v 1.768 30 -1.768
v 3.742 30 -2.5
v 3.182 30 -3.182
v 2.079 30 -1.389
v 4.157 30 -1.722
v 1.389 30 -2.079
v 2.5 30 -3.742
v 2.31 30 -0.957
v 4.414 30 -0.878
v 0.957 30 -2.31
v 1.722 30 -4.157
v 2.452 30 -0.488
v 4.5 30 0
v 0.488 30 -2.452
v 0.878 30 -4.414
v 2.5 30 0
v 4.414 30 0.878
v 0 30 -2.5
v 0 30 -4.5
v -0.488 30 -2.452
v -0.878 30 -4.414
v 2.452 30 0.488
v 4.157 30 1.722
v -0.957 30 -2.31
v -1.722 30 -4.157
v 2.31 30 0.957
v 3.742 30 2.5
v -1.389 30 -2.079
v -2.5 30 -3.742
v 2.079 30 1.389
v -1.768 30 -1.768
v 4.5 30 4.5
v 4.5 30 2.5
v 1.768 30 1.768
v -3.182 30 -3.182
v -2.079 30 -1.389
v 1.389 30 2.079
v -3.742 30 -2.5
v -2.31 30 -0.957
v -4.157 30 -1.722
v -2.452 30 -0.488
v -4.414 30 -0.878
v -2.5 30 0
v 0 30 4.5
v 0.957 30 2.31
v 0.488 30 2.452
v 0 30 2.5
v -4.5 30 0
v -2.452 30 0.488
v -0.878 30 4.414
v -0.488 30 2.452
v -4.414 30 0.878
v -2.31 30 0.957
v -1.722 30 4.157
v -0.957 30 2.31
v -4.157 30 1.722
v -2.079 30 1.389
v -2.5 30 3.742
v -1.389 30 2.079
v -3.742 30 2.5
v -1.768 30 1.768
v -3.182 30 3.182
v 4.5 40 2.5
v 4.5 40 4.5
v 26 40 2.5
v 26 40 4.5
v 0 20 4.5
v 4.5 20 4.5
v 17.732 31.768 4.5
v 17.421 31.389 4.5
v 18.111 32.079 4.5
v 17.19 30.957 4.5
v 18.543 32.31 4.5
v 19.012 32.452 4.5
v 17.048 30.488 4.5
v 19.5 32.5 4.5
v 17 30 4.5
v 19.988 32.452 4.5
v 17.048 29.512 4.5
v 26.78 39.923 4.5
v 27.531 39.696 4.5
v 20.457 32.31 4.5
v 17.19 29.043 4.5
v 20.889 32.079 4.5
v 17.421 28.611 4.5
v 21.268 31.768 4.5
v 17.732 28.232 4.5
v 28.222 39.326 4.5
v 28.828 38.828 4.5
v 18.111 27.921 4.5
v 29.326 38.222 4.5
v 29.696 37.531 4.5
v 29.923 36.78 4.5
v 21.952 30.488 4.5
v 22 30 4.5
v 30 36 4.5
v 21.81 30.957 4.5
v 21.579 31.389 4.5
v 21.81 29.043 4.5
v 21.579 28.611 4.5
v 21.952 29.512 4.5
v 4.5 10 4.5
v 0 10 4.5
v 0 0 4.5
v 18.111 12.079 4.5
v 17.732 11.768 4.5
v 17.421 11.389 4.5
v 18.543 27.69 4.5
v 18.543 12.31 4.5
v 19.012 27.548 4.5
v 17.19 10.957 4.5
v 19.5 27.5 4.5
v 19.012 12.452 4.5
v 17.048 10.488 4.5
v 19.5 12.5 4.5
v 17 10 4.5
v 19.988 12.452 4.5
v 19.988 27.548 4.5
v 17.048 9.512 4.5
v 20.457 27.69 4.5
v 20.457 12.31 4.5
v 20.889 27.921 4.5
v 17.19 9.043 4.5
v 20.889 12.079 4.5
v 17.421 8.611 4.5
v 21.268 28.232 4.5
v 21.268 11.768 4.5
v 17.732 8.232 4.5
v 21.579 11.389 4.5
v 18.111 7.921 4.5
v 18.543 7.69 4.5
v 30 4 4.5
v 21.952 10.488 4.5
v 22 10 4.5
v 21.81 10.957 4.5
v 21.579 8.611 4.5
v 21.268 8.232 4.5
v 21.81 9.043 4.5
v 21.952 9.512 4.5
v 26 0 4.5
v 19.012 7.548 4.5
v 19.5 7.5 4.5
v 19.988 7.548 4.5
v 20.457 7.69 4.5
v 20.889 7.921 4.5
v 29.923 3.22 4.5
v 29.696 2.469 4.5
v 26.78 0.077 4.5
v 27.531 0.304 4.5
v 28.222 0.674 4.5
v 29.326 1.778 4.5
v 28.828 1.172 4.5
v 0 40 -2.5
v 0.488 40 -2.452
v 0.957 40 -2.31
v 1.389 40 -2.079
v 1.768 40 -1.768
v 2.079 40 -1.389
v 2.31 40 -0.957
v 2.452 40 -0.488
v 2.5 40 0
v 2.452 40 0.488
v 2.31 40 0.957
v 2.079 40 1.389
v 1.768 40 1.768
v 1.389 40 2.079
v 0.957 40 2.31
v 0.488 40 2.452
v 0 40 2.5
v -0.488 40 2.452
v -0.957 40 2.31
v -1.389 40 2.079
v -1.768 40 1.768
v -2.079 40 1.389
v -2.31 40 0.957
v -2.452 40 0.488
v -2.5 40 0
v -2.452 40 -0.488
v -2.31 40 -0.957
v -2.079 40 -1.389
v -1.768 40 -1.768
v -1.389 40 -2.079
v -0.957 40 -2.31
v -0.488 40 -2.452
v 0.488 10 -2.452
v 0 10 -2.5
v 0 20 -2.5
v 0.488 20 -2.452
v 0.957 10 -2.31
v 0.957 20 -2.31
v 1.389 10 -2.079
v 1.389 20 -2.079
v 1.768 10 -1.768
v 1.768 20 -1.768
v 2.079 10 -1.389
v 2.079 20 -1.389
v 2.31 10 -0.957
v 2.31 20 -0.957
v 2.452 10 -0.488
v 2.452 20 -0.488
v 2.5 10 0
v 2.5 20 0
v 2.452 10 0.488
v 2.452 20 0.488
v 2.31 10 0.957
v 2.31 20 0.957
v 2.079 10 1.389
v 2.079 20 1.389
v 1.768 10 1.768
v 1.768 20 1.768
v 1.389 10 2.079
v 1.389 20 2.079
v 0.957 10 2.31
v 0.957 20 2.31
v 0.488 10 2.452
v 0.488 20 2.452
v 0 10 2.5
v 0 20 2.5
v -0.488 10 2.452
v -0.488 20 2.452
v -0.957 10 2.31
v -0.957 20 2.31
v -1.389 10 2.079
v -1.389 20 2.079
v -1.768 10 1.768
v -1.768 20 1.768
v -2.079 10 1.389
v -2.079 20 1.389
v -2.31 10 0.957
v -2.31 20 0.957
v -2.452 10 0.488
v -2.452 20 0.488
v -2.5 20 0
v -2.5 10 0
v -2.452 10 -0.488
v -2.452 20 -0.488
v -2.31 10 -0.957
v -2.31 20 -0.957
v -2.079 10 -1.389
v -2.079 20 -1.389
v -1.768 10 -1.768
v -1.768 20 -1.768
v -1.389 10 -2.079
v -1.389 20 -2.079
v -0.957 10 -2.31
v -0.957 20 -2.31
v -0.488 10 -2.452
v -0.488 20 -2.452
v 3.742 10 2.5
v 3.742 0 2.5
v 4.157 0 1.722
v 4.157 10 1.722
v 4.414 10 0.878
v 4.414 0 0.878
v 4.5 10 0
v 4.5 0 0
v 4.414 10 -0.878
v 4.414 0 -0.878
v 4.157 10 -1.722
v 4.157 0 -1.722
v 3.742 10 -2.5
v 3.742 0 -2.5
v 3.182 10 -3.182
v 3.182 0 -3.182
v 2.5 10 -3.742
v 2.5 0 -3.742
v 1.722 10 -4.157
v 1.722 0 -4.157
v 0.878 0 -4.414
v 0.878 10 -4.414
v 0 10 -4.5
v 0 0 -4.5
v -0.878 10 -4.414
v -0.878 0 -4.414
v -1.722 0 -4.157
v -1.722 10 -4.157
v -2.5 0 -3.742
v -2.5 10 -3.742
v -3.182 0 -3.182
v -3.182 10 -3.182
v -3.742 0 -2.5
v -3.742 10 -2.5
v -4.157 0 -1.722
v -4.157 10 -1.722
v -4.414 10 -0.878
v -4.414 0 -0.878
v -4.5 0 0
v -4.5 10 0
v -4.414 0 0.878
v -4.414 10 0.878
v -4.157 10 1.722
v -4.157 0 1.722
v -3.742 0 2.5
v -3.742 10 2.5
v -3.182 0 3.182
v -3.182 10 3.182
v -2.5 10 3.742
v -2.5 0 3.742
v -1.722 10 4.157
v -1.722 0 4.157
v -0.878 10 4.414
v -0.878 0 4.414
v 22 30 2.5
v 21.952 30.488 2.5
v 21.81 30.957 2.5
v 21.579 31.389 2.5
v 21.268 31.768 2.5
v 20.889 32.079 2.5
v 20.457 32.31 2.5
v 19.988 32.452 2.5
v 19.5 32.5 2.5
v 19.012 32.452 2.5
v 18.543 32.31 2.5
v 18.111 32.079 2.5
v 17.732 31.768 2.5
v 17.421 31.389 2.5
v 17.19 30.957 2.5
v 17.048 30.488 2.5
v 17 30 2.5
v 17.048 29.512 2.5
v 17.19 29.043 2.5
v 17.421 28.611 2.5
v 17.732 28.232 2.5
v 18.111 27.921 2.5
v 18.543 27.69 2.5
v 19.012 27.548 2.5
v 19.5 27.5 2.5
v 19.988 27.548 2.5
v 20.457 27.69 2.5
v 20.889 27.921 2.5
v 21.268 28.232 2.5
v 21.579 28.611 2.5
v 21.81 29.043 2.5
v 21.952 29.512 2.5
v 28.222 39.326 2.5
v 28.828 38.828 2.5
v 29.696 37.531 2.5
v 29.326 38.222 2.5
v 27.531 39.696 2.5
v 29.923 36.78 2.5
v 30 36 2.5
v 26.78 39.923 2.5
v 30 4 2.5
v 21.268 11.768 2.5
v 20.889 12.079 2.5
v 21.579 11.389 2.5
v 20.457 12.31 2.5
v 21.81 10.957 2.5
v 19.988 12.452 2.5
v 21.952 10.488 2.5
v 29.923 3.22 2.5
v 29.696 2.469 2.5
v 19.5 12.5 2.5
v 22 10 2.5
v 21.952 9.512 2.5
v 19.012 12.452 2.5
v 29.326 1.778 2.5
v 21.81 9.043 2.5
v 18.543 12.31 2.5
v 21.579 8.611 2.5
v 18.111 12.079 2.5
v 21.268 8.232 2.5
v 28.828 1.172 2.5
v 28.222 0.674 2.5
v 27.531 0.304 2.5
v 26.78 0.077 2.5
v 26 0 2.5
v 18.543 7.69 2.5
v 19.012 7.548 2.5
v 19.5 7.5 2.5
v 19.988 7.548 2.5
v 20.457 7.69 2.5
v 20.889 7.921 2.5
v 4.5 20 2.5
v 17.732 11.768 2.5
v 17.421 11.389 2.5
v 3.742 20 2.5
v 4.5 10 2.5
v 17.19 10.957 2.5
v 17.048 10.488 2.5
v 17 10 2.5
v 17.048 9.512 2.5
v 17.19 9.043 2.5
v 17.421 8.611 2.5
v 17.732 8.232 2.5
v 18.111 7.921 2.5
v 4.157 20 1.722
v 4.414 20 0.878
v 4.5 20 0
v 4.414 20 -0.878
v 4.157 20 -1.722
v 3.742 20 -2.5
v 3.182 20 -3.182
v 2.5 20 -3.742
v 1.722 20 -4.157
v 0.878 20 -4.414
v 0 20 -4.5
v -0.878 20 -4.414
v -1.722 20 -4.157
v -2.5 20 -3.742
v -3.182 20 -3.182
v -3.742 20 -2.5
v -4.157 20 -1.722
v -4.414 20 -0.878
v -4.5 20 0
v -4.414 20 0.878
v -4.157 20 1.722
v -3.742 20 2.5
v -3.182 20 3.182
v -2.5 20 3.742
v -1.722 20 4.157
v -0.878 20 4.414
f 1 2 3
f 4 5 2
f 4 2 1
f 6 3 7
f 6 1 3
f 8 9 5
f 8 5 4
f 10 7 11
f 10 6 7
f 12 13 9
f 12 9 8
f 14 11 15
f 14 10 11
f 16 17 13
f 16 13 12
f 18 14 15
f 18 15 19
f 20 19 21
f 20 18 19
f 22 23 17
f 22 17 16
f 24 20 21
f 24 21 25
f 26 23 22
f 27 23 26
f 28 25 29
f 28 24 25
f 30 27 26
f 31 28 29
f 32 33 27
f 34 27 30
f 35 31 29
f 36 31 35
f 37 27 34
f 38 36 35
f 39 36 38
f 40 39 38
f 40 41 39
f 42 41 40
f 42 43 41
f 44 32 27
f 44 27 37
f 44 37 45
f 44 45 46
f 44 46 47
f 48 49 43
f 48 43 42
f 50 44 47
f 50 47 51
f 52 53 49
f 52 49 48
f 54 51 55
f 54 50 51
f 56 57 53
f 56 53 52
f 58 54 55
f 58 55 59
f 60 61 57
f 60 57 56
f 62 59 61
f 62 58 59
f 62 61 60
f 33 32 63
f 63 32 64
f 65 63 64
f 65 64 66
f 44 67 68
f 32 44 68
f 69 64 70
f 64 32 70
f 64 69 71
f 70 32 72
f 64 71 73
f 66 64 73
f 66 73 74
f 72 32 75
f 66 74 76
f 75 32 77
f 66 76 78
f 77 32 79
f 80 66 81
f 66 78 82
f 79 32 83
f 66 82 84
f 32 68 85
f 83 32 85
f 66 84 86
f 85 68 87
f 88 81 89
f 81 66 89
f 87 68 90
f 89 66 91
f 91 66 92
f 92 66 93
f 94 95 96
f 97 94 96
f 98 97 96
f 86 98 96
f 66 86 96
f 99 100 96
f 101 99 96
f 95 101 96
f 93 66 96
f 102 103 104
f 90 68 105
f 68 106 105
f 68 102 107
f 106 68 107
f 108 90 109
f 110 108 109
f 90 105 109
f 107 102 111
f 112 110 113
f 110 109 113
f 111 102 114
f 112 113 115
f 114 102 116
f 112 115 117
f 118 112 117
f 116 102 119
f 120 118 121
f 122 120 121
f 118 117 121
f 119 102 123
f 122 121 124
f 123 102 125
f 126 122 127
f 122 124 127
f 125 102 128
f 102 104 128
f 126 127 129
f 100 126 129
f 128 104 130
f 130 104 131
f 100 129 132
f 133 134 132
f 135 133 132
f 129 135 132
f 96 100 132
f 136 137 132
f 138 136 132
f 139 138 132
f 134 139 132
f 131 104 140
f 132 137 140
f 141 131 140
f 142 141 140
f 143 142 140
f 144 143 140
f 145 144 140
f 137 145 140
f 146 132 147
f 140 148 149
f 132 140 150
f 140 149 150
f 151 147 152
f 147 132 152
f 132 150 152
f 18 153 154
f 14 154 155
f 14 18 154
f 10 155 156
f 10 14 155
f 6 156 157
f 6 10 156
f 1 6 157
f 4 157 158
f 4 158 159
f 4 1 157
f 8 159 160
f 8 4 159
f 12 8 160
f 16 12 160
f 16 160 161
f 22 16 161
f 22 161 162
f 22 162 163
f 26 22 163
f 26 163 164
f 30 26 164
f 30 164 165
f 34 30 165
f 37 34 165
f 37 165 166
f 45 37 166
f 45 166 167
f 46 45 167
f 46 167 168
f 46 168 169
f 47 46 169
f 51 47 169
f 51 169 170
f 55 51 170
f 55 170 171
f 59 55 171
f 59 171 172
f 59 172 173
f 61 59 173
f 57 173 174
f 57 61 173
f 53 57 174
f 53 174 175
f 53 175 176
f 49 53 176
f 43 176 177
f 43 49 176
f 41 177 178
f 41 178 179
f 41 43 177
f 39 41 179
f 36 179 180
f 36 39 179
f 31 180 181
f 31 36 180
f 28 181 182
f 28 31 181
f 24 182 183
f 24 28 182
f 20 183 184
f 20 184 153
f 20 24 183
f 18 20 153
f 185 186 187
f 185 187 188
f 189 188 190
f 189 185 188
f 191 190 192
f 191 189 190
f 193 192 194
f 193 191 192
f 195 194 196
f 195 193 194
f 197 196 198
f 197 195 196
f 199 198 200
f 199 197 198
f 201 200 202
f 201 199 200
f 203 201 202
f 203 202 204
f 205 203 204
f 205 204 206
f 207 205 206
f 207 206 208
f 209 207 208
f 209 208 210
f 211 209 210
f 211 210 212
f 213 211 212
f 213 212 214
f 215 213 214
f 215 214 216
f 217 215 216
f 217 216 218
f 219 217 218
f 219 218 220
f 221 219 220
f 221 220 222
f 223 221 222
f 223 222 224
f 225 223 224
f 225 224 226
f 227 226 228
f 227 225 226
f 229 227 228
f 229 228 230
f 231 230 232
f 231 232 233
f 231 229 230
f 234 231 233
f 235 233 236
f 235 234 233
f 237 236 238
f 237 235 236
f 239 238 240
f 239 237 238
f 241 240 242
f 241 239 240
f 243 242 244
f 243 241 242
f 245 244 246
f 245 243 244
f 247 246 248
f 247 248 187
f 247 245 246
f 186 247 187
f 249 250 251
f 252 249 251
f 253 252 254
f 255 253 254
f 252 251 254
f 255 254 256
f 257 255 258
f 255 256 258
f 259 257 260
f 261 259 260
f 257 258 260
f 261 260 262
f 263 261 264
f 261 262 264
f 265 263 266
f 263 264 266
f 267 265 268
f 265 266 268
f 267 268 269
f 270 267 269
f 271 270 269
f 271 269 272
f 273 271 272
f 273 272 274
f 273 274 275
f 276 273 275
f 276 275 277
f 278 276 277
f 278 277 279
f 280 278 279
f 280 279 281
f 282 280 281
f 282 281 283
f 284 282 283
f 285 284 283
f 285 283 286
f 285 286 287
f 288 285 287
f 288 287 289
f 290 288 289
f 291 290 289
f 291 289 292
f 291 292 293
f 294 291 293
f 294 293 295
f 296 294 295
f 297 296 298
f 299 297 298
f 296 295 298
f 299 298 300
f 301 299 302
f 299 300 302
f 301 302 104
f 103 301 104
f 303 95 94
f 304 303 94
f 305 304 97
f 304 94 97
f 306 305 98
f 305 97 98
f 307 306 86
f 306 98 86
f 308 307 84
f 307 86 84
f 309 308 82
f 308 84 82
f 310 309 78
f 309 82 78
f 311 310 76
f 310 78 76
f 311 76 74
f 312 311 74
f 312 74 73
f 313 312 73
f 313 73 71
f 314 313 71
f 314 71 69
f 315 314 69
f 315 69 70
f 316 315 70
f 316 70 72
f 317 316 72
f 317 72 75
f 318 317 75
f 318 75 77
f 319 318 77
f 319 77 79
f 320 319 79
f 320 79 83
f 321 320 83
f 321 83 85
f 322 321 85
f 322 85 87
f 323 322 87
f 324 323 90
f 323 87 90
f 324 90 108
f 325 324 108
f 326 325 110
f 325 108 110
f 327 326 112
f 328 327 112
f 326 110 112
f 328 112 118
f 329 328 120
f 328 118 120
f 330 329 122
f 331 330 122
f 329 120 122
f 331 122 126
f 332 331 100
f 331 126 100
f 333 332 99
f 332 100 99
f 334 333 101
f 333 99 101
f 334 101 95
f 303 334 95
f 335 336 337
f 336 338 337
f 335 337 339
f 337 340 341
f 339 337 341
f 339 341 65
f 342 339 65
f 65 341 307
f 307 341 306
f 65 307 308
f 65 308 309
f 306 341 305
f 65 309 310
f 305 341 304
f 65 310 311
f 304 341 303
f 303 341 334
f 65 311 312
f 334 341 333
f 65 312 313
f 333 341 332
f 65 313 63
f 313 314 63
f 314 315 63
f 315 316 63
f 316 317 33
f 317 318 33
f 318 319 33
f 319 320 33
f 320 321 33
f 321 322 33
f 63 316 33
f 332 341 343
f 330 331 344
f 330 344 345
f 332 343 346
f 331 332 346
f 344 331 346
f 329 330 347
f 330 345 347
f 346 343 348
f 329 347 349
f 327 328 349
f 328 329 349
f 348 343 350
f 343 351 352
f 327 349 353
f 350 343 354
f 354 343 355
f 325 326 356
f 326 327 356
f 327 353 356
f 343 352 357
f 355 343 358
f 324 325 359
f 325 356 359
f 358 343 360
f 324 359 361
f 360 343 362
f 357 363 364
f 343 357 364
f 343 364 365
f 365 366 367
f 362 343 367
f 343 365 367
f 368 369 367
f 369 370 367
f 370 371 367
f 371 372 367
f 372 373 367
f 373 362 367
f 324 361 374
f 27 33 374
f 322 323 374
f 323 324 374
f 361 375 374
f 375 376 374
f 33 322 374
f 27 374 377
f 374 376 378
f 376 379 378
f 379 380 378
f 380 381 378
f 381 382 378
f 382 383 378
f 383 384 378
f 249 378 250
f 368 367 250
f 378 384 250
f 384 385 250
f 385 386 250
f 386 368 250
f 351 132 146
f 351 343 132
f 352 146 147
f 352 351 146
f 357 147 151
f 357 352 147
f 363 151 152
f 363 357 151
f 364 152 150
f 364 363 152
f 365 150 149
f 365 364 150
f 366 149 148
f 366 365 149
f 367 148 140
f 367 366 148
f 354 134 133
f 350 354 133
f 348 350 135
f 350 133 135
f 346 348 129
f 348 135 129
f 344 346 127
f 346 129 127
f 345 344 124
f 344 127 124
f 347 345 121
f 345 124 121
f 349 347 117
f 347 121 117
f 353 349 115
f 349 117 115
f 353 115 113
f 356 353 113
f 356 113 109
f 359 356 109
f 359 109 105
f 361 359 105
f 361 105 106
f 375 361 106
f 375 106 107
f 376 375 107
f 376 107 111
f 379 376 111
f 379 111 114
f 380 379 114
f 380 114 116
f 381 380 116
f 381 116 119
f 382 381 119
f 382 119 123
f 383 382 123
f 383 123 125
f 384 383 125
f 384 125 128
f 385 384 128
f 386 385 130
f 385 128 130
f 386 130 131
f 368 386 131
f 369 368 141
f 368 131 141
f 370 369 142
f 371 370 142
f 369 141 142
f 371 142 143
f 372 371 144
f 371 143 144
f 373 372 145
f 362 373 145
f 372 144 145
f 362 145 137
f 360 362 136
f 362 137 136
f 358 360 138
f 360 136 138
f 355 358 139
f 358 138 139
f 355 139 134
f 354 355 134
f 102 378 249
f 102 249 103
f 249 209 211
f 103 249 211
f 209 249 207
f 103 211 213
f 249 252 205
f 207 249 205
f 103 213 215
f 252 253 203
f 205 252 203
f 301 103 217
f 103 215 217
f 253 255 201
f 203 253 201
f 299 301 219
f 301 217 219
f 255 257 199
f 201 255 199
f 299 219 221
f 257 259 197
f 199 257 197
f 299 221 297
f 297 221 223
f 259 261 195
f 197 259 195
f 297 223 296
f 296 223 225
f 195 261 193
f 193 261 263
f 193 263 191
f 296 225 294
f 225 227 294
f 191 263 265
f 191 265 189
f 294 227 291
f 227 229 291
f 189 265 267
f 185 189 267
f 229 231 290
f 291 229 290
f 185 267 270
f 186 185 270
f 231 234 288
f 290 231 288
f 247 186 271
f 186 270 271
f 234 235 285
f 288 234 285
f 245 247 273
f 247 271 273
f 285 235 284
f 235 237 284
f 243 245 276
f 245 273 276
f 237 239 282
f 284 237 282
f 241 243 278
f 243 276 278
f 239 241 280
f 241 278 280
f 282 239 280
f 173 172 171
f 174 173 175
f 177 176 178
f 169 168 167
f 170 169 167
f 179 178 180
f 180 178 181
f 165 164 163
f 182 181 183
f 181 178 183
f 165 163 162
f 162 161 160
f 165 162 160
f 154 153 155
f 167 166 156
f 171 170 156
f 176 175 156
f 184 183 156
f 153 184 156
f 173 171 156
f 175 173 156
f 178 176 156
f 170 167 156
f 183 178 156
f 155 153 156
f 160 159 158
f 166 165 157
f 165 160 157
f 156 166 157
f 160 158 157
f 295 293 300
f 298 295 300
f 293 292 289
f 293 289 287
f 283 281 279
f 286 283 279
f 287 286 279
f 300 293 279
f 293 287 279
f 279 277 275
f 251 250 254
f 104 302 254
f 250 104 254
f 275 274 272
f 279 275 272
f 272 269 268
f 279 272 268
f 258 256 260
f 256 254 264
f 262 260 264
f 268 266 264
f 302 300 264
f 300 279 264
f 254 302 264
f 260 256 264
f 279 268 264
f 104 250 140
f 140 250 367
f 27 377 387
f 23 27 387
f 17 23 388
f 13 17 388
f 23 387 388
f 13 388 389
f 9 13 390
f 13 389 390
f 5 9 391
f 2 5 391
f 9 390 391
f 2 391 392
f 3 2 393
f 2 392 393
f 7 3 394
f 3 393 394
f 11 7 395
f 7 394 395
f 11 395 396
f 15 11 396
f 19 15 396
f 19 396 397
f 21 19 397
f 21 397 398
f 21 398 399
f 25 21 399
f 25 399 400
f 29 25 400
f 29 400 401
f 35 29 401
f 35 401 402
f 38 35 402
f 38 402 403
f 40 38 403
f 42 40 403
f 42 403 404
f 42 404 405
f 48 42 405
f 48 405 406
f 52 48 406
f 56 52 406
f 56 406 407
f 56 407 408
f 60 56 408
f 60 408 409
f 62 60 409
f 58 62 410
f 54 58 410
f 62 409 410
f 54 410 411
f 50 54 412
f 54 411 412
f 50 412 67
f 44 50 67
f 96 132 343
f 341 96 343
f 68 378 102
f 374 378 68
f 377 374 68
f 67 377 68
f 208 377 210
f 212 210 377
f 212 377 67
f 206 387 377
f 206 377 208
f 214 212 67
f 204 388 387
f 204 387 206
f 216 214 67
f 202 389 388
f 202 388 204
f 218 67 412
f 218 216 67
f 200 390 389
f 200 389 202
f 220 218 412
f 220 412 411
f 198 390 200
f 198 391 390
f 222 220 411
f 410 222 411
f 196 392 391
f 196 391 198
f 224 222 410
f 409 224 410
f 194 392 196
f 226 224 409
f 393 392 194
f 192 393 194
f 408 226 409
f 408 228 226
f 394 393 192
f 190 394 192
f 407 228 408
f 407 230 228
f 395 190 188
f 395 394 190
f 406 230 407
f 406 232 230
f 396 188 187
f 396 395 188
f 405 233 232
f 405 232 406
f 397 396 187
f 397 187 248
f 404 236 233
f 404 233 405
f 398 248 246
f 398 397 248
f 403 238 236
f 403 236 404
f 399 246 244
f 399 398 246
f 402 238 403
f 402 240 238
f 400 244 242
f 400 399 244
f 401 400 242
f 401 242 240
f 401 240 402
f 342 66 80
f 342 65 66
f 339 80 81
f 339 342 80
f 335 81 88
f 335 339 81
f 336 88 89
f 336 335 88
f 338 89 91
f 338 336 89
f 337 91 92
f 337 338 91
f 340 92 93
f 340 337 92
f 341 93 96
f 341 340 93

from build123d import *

# Parameters (mm, degrees)
SKETCH_1_R          = 2.5
EXTRUDE_1_DEPTH     = 40
CUT_EXTRUDE_1_REACH = 52.804
SKETCH_2_R          = 2.5
SKETCH_3_W          = 9
SKETCH_3_H          = 10
CUT_EXTRUDE_2_DEPTH = 20
FILLET_1_R          = 4
SKETCH_4_R          = 2.5
EXTRUDE_2_DEPTH     = 40


with BuildPart() as part:
    # 草图1 → 凸台-拉伸1 (new body)
    with BuildSketch(Plane(origin=(0, 0, 0), x_dir=(1, 0, 0), z_dir=(0, 1, 0))):
        with BuildLine():
            Line((0, -4.5), (30, -4.5))
            Line((30, -4.5), (30, -2.5))
            Line((30, -2.5), (3.741657387, -2.5))
            ThreePointArc((3.741657387, -2.5), (-2.121320344, 3.968626967), (0, -4.5))
        make_face()
        with Locations(Location((0, 0, 0), (0, 0, 270))):
            Circle(SKETCH_1_R, mode=Mode.SUBTRACT)
    extrude(amount=EXTRUDE_1_DEPTH)

    # 草图2 → 切除-拉伸1 (cut, up to next)
    with BuildSketch(Plane.XY.offset(4.5), mode=Mode.PRIVATE) as cut_extrude_1_sk1:
        with Locations((19.5, 30)):
            Circle(SKETCH_2_R)
    cut_extrude_1_tool1 = extrude(cut_extrude_1_sk1.sketch, amount=-CUT_EXTRUDE_1_REACH, mode=Mode.PRIVATE) & part.part
    # 草图2 → 切除-拉伸1 (cut, up to next)
    with BuildSketch(Plane.XY.offset(4.5), mode=Mode.PRIVATE) as cut_extrude_1_sk2:
        with Locations((19.5, 10)):
            Circle(SKETCH_2_R)
    cut_extrude_1_tool2 = extrude(cut_extrude_1_sk2.sketch, amount=-CUT_EXTRUDE_1_REACH, mode=Mode.PRIVATE) & part.part
    add(cut_extrude_1_tool1.solids().sort_by_distance((19.5, 30, 4.5))[0], mode=Mode.SUBTRACT)
    add(cut_extrude_1_tool2.solids().sort_by_distance((19.5, 10, 4.5))[0], mode=Mode.SUBTRACT)

    # 草图3 → 切除-拉伸2 (cut, symmetric)
    with BuildSketch(Plane(origin=(0, 0, 2.5), x_dir=(-1, 0, 0), z_dir=(0, 0, -1))):
        with Locations((0, 35)):
            Rectangle(SKETCH_3_W, SKETCH_3_H)
        with Locations((0, 15)):
            Rectangle(SKETCH_3_W, SKETCH_3_H)
    extrude(amount=CUT_EXTRUDE_2_DEPTH, both=True, mode=Mode.SUBTRACT)

    # 圆角1
    fillet_1_edges = [part.edges().sort_by_distance(p)[0] for p in [
        (30, 40, 3.5),
        (30, 0, 3.5),
    ]]
    fillet(fillet_1_edges, radius=FILLET_1_R)

    # 草图4 → 凸台-拉伸2 (add)
    with BuildSketch(Plane.XZ):
        with Locations(Location((0, 0, 0), (0, 0, 270))):
            Circle(SKETCH_4_R)
    extrude(amount=-EXTRUDE_2_DEPTH)


solid = part.part
